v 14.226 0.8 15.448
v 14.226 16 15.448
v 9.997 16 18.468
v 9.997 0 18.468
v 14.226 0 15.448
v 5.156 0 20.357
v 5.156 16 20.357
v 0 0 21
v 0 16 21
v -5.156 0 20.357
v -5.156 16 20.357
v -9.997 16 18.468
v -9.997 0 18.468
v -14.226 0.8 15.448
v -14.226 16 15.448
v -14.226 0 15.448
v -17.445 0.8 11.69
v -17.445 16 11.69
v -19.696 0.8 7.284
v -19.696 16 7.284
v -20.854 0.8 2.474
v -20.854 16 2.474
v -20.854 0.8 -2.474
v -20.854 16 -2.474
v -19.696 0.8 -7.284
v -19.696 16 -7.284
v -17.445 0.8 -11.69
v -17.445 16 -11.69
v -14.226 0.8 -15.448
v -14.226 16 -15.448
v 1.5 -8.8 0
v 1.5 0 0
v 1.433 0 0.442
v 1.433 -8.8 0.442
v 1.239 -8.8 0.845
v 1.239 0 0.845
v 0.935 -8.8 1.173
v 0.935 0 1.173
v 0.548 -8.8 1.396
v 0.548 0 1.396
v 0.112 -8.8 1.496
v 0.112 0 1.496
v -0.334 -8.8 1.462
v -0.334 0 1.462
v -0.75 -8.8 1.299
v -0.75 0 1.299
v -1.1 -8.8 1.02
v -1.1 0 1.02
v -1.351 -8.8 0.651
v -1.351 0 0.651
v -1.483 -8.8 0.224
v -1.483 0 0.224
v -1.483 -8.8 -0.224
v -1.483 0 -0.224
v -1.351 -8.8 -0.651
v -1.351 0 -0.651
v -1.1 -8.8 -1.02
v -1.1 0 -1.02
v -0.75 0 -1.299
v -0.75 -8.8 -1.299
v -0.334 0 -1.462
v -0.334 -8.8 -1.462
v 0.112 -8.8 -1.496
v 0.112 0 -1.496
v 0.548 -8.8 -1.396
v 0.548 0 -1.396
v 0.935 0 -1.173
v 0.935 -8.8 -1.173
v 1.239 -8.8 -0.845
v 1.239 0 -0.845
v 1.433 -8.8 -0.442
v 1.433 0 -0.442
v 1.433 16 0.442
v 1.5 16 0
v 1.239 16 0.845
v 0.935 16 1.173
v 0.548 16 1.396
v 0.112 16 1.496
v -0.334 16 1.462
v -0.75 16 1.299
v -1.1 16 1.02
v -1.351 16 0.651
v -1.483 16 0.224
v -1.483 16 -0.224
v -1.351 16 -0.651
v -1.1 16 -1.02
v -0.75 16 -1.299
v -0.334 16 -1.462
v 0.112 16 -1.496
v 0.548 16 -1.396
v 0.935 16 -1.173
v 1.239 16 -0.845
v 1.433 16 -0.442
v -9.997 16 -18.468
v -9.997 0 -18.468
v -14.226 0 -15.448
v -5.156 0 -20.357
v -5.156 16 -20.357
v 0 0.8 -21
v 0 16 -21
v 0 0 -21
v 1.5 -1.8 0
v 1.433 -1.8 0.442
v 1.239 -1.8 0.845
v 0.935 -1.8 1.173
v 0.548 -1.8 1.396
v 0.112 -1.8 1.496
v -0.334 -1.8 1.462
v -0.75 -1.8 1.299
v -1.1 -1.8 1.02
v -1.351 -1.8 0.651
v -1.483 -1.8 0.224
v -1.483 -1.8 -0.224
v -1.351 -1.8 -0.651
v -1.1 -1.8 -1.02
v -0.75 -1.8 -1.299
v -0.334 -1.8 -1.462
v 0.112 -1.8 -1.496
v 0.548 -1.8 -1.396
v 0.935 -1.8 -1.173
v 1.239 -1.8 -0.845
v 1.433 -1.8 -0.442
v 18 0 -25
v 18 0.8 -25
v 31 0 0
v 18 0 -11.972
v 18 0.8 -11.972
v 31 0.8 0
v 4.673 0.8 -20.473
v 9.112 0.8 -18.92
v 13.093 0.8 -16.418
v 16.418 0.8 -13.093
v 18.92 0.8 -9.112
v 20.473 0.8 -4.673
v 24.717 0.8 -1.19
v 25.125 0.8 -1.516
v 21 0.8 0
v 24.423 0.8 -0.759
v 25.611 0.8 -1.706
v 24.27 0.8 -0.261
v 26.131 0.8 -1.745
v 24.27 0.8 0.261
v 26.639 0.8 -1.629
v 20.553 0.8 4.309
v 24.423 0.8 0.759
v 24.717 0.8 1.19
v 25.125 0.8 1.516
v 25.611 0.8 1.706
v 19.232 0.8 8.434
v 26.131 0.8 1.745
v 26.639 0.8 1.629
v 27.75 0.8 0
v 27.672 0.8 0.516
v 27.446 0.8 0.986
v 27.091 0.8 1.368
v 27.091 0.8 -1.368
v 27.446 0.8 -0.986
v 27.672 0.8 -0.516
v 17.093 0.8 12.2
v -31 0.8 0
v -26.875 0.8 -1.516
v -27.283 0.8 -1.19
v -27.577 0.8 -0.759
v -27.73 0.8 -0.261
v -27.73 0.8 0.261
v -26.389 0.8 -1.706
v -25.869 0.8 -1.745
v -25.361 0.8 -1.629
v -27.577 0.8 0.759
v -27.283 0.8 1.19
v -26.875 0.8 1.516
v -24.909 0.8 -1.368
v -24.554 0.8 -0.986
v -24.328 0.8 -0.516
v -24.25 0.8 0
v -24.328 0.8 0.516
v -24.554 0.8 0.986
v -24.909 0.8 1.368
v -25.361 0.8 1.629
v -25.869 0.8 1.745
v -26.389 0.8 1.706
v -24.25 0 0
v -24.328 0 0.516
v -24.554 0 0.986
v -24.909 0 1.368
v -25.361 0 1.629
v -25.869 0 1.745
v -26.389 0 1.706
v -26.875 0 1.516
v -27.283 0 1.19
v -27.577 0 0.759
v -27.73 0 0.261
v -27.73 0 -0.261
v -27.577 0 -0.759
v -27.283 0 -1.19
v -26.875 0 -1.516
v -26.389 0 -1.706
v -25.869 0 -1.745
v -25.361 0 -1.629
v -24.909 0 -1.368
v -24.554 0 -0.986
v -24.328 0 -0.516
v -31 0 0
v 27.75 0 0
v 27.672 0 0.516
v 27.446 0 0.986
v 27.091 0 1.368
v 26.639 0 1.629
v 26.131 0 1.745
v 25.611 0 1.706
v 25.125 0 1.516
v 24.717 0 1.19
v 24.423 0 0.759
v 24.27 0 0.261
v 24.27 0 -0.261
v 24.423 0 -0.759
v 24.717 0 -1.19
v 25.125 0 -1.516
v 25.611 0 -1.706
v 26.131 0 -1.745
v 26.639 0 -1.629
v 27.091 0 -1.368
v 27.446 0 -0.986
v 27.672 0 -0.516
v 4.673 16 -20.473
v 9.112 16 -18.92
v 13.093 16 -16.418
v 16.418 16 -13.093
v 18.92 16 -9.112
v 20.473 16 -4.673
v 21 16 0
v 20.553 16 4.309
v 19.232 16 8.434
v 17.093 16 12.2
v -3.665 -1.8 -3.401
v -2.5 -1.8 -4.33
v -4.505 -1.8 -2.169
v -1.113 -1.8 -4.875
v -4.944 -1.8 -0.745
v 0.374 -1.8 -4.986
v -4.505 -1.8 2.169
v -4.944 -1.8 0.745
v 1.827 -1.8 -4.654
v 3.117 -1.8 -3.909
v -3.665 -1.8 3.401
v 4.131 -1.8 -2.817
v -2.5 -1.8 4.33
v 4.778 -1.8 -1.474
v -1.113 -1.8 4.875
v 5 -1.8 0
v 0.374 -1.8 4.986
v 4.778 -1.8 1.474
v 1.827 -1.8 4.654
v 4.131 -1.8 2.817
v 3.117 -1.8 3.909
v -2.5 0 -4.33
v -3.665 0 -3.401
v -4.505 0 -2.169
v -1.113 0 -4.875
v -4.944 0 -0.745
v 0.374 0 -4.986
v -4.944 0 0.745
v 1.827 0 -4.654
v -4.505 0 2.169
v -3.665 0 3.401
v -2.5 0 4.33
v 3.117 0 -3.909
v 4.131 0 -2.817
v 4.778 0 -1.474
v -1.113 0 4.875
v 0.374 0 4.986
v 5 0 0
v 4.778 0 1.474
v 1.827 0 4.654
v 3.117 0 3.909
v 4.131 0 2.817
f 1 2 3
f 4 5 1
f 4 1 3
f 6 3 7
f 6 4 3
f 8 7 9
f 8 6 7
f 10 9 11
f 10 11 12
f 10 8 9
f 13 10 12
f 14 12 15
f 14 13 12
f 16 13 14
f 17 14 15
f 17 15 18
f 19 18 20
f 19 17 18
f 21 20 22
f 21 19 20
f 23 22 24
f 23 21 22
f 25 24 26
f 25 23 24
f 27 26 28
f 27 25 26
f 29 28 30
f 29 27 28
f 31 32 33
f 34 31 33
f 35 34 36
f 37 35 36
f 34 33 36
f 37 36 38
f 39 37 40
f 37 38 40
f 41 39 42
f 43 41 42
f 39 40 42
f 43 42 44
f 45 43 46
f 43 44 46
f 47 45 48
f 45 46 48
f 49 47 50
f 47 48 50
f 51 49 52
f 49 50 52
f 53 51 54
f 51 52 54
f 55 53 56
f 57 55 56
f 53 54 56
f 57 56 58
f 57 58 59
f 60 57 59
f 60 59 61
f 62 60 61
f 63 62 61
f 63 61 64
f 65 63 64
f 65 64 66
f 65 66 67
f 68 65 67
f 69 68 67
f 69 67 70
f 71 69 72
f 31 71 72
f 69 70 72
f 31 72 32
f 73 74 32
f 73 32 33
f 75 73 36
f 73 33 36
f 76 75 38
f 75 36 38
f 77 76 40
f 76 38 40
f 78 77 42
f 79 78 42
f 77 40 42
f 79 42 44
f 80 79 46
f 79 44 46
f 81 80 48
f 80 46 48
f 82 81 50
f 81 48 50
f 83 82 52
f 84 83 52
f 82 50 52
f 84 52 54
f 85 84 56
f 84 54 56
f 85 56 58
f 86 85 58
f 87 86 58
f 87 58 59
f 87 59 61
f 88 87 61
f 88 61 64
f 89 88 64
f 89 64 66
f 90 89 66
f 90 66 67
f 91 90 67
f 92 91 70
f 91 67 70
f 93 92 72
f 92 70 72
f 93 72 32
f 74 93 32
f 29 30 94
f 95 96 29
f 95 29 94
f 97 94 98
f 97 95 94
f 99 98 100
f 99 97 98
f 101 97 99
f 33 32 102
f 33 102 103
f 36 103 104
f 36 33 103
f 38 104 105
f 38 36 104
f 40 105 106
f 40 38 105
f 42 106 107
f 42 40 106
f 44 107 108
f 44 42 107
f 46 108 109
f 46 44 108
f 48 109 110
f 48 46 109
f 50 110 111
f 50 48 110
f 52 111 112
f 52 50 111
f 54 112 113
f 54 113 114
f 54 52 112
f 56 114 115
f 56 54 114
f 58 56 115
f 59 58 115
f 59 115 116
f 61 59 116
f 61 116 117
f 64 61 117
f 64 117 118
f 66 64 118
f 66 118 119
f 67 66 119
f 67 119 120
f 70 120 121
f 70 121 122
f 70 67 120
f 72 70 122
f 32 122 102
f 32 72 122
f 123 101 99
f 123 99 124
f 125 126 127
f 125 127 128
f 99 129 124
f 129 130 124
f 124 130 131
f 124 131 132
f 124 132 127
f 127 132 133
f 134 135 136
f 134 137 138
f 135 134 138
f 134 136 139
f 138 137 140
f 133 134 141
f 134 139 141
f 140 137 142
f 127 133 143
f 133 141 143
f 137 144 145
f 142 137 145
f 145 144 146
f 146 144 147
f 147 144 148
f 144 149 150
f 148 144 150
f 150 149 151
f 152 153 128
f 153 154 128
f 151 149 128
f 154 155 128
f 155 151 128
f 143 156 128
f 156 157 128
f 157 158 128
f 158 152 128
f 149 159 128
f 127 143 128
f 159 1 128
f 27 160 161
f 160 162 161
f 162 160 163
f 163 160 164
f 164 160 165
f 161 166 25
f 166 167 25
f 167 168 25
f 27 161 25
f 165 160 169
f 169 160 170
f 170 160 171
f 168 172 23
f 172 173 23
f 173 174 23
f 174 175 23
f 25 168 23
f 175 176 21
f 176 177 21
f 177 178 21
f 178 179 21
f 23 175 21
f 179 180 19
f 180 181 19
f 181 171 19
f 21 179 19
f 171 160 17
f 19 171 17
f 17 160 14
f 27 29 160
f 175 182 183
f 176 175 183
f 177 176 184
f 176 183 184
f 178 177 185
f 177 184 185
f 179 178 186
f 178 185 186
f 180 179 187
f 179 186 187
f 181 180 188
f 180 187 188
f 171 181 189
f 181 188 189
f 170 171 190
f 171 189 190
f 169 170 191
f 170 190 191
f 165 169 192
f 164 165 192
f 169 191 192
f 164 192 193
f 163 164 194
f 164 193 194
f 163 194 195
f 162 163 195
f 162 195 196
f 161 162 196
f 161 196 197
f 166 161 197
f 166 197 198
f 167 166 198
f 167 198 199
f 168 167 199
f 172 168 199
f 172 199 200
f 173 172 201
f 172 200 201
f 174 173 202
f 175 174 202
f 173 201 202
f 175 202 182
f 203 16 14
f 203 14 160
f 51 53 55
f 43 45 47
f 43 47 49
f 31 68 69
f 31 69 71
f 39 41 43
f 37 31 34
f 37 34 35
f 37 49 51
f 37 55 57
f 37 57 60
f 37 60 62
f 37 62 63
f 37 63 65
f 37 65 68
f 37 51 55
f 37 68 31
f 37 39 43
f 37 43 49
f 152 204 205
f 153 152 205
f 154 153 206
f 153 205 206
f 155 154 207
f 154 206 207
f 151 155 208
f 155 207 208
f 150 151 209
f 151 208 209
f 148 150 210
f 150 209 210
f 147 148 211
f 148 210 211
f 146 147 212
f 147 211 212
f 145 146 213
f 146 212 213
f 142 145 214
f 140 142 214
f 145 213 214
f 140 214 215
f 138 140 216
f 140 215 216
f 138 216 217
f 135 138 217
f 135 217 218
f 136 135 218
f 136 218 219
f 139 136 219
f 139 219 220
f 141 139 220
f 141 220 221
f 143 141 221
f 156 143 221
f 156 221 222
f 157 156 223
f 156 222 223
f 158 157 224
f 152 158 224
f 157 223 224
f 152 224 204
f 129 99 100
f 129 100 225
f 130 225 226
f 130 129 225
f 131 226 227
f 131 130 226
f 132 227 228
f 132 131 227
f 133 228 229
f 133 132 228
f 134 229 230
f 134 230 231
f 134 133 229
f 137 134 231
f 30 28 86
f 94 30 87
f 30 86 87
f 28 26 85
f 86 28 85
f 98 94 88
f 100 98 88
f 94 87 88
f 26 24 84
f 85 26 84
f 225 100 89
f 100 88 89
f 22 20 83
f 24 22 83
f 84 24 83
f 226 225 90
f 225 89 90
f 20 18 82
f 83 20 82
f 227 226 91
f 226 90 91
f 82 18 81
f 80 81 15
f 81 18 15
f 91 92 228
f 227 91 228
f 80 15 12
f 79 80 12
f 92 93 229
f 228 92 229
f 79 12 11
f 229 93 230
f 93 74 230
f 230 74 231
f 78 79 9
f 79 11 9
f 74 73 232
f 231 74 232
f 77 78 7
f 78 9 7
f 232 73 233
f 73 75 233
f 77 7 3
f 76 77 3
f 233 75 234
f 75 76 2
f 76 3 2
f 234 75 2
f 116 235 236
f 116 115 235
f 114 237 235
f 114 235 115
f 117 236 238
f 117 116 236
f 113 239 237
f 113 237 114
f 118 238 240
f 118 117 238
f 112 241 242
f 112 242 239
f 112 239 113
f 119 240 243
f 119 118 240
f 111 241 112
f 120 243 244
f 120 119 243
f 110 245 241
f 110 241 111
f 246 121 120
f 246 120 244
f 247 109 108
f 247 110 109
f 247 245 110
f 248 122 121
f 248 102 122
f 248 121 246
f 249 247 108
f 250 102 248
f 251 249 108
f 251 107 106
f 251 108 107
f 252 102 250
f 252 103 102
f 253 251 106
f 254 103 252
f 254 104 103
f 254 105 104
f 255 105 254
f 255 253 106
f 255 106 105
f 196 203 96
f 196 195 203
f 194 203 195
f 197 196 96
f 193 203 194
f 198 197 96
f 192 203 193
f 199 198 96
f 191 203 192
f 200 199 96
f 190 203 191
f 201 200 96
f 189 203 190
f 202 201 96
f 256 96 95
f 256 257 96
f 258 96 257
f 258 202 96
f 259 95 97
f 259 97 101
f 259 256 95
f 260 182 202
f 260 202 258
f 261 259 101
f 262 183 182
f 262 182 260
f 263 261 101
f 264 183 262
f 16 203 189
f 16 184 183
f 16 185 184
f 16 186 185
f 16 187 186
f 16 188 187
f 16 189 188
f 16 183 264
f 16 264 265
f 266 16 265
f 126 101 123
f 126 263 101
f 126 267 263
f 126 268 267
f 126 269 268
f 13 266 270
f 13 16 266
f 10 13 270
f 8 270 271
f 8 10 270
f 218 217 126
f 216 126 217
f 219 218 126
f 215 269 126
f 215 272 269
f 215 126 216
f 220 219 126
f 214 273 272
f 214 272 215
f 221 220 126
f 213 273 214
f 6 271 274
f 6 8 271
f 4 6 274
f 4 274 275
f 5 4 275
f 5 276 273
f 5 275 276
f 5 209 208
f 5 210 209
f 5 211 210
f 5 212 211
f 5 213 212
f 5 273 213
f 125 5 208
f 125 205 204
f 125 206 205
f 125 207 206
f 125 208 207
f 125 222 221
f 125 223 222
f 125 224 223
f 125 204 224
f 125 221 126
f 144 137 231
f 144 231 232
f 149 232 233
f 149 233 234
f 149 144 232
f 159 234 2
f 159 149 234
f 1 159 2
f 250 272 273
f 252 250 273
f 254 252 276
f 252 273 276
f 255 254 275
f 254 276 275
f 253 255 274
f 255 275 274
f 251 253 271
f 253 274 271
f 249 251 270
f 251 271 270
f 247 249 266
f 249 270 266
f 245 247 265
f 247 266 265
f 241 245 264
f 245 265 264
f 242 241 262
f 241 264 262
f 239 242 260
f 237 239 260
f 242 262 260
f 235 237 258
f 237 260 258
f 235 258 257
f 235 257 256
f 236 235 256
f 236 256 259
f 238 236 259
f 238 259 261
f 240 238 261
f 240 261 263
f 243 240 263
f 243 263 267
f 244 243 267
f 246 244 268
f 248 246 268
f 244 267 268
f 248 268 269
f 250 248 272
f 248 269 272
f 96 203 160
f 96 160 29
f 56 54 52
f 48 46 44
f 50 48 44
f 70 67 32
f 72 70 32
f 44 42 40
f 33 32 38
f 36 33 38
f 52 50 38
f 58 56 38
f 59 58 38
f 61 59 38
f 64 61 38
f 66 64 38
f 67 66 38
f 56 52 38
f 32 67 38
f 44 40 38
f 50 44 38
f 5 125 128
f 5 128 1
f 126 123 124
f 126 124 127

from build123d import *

# Parameters (mm, degrees)
F0_R     = 1.5
F1_DEPTH = 8.8
F0_R_2   = 5
F2_DEPTH = 1.8
F3_DEPTH = 16
F0_R_3   = 1.75
F4_DEPTH = 0.8


with BuildPart() as f1:
    # F0 (on Front) → F1 (new body)
    with BuildSketch(Plane.XZ):
        Circle(F0_R)
    extrude(amount=F1_DEPTH)


with BuildPart() as f2:
    # F0 (on Front) → F2 (new body)
    with BuildSketch(Plane.XZ):
        Circle(F0_R_2)
        Circle(F0_R, mode=Mode.SUBTRACT)
    extrude(amount=F2_DEPTH)

    # F0 (on Front) → F3 (join)
    with BuildSketch(Plane.XZ):
        with BuildLine():
            ThreePointArc((0, -21), (14.8492424049, -14.8492424049), (21, 0))
            ThreePointArc((21, 0), (19.2320297354, 8.4338029535), (14.2258064516, 15.4475380175))
            ThreePointArc((14.2258064516, 15.4475380175), (0, 21), (-14.2258064516, 15.4475380175))
            ThreePointArc((-14.2258064516, 15.4475380175), (-21, 0), (-14.2258064516, -15.4475380175))
            ThreePointArc((-14.2258064516, -15.4475380175), (-7.6354993823, -19.5626979015), (0, -21))
        make_face()
        Circle(F0_R_2, mode=Mode.SUBTRACT)
        Circle(F0_R_2)
        Circle(F0_R, mode=Mode.SUBTRACT)
    extrude(amount=-F3_DEPTH)

    # F0 (on Front) → F4 (join)
    with BuildSketch(Plane.XZ):
        with BuildLine():
            ThreePointArc((-14.2258064516, -15.4475380175), (-21, 0), (-14.2258064516, 15.4475380175))
            Line((-14.2258064516, 15.4475380175), (-31, 0))
            Line((-31, 0), (-14.2258064516, -15.4475380175))
        make_face()
        with Locations((-26, 0)):
            Circle(F0_R_3, mode=Mode.SUBTRACT)
        with BuildLine():
            ThreePointArc((14.2258064516, 15.4475380175), (19.2320297354, 8.4338029535), (21, 0))
            ThreePointArc((21, 0), (14.8492424049, -14.8492424049), (0, -21))
            Line((0, -21), (18, -25))
            Line((18, -25), (18, -11.9718419635))
            Line((18, -11.9718419635), (31, 0))
            Line((31, 0), (14.2258064516, 15.4475380175))
        make_face()
        with Locations((26, 0)):
            Circle(F0_R_3, mode=Mode.SUBTRACT)
        with BuildLine():
            ThreePointArc((0, -21), (14.8492424049, -14.8492424049), (21, 0))
            ThreePointArc((21, 0), (19.2320297354, 8.4338029535), (14.2258064516, 15.4475380175))
            ThreePointArc((14.2258064516, 15.4475380175), (0, 21), (-14.2258064516, 15.4475380175))
            ThreePointArc((-14.2258064516, 15.4475380175), (-21, 0), (-14.2258064516, -15.4475380175))
            ThreePointArc((-14.2258064516, -15.4475380175), (-7.6354993823, -19.5626979015), (0, -21))
        make_face()
        Circle(F0_R_2, mode=Mode.SUBTRACT)
    extrude(amount=-F4_DEPTH)


solid = Compound([f1.part, f2.part])
